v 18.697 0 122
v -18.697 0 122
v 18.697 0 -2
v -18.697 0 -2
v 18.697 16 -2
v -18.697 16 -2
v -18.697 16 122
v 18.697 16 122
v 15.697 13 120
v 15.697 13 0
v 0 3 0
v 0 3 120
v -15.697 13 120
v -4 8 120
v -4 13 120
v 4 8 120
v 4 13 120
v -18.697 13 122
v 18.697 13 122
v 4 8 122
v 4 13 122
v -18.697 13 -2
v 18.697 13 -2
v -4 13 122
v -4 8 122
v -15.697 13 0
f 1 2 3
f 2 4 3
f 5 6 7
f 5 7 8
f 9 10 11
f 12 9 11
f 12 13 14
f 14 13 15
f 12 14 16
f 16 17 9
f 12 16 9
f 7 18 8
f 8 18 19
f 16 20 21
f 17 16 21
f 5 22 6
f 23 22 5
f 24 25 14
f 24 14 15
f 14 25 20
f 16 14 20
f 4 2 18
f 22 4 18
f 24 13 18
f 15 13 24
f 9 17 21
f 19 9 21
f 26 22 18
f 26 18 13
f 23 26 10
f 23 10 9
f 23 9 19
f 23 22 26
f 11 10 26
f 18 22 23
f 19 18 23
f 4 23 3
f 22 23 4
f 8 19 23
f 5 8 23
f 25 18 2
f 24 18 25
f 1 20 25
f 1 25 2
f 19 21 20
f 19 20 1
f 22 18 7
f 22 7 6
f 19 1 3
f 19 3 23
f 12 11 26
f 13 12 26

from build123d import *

# Parameters (mm, degrees)
BOSS_EXTRUDE1_DEPTH = 120
SKETCH2_W           = 37.393711542
SKETCH2_H           = 13
BOSS_EXTRUDE2_DEPTH = 2
SKETCH3_W           = 37.393711542
SKETCH3_H           = 13
BOSS_EXTRUDE3_DEPTH = 2
SKETCH5_W           = 37.393711542
SKETCH5_H           = 124
BOSS_EXTRUDE4_DEPTH = 3
SKETCH6_W           = 8
SKETCH6_H           = 5
CUT_EXTRUDE1_DEPTH  = 3


with BuildPart() as part:
    # Sketch1 → Boss-Extrude1 (new body)
    with BuildSketch(Plane.XY):
        Polygon((-18.696855771, 0), (18.696855771, 0), (18.696855771, 13), (15.696855771, 13), (0, 3), (-15.696855771, 13), (-18.696855771, 13), align=None)
    extrude(amount=BOSS_EXTRUDE1_DEPTH)

    # Sketch2 → Boss-Extrude2 (add)
    with BuildSketch(Plane(origin=(0, 0, 0), x_dir=(-1, 0, 0), z_dir=(0, 0, -1))):
        with Locations((0, 6.5)):
            Rectangle(SKETCH2_W, SKETCH2_H)
    extrude(amount=BOSS_EXTRUDE2_DEPTH)

    # Sketch3 → Boss-Extrude3 (add)
    with BuildSketch(Plane.XY.offset(120)):
        with Locations((0, 6.5)):
            Rectangle(SKETCH3_W, SKETCH3_H)
    extrude(amount=BOSS_EXTRUDE3_DEPTH)

    # Sketch6 → Cut-Extrude1 (cut)
    with BuildSketch(Plane.XY.offset(122)):
        with Locations((0, 10.5)):
            Rectangle(SKETCH6_W, SKETCH6_H)
    extrude(amount=-CUT_EXTRUDE1_DEPTH, mode=Mode.SUBTRACT)


with BuildPart() as body_2:
    # Sketch5 → Boss-Extrude4 (new body)
    with BuildSketch(Plane(origin=(0, 13, 0), x_dir=(1, 0, 0), z_dir=(0, 1, 0))):
        with Locations((0, -60)):
            Rectangle(SKETCH5_W, SKETCH5_H)
    extrude(amount=BOSS_EXTRUDE4_DEPTH)


solid = Compound([part.part, body_2.part])
